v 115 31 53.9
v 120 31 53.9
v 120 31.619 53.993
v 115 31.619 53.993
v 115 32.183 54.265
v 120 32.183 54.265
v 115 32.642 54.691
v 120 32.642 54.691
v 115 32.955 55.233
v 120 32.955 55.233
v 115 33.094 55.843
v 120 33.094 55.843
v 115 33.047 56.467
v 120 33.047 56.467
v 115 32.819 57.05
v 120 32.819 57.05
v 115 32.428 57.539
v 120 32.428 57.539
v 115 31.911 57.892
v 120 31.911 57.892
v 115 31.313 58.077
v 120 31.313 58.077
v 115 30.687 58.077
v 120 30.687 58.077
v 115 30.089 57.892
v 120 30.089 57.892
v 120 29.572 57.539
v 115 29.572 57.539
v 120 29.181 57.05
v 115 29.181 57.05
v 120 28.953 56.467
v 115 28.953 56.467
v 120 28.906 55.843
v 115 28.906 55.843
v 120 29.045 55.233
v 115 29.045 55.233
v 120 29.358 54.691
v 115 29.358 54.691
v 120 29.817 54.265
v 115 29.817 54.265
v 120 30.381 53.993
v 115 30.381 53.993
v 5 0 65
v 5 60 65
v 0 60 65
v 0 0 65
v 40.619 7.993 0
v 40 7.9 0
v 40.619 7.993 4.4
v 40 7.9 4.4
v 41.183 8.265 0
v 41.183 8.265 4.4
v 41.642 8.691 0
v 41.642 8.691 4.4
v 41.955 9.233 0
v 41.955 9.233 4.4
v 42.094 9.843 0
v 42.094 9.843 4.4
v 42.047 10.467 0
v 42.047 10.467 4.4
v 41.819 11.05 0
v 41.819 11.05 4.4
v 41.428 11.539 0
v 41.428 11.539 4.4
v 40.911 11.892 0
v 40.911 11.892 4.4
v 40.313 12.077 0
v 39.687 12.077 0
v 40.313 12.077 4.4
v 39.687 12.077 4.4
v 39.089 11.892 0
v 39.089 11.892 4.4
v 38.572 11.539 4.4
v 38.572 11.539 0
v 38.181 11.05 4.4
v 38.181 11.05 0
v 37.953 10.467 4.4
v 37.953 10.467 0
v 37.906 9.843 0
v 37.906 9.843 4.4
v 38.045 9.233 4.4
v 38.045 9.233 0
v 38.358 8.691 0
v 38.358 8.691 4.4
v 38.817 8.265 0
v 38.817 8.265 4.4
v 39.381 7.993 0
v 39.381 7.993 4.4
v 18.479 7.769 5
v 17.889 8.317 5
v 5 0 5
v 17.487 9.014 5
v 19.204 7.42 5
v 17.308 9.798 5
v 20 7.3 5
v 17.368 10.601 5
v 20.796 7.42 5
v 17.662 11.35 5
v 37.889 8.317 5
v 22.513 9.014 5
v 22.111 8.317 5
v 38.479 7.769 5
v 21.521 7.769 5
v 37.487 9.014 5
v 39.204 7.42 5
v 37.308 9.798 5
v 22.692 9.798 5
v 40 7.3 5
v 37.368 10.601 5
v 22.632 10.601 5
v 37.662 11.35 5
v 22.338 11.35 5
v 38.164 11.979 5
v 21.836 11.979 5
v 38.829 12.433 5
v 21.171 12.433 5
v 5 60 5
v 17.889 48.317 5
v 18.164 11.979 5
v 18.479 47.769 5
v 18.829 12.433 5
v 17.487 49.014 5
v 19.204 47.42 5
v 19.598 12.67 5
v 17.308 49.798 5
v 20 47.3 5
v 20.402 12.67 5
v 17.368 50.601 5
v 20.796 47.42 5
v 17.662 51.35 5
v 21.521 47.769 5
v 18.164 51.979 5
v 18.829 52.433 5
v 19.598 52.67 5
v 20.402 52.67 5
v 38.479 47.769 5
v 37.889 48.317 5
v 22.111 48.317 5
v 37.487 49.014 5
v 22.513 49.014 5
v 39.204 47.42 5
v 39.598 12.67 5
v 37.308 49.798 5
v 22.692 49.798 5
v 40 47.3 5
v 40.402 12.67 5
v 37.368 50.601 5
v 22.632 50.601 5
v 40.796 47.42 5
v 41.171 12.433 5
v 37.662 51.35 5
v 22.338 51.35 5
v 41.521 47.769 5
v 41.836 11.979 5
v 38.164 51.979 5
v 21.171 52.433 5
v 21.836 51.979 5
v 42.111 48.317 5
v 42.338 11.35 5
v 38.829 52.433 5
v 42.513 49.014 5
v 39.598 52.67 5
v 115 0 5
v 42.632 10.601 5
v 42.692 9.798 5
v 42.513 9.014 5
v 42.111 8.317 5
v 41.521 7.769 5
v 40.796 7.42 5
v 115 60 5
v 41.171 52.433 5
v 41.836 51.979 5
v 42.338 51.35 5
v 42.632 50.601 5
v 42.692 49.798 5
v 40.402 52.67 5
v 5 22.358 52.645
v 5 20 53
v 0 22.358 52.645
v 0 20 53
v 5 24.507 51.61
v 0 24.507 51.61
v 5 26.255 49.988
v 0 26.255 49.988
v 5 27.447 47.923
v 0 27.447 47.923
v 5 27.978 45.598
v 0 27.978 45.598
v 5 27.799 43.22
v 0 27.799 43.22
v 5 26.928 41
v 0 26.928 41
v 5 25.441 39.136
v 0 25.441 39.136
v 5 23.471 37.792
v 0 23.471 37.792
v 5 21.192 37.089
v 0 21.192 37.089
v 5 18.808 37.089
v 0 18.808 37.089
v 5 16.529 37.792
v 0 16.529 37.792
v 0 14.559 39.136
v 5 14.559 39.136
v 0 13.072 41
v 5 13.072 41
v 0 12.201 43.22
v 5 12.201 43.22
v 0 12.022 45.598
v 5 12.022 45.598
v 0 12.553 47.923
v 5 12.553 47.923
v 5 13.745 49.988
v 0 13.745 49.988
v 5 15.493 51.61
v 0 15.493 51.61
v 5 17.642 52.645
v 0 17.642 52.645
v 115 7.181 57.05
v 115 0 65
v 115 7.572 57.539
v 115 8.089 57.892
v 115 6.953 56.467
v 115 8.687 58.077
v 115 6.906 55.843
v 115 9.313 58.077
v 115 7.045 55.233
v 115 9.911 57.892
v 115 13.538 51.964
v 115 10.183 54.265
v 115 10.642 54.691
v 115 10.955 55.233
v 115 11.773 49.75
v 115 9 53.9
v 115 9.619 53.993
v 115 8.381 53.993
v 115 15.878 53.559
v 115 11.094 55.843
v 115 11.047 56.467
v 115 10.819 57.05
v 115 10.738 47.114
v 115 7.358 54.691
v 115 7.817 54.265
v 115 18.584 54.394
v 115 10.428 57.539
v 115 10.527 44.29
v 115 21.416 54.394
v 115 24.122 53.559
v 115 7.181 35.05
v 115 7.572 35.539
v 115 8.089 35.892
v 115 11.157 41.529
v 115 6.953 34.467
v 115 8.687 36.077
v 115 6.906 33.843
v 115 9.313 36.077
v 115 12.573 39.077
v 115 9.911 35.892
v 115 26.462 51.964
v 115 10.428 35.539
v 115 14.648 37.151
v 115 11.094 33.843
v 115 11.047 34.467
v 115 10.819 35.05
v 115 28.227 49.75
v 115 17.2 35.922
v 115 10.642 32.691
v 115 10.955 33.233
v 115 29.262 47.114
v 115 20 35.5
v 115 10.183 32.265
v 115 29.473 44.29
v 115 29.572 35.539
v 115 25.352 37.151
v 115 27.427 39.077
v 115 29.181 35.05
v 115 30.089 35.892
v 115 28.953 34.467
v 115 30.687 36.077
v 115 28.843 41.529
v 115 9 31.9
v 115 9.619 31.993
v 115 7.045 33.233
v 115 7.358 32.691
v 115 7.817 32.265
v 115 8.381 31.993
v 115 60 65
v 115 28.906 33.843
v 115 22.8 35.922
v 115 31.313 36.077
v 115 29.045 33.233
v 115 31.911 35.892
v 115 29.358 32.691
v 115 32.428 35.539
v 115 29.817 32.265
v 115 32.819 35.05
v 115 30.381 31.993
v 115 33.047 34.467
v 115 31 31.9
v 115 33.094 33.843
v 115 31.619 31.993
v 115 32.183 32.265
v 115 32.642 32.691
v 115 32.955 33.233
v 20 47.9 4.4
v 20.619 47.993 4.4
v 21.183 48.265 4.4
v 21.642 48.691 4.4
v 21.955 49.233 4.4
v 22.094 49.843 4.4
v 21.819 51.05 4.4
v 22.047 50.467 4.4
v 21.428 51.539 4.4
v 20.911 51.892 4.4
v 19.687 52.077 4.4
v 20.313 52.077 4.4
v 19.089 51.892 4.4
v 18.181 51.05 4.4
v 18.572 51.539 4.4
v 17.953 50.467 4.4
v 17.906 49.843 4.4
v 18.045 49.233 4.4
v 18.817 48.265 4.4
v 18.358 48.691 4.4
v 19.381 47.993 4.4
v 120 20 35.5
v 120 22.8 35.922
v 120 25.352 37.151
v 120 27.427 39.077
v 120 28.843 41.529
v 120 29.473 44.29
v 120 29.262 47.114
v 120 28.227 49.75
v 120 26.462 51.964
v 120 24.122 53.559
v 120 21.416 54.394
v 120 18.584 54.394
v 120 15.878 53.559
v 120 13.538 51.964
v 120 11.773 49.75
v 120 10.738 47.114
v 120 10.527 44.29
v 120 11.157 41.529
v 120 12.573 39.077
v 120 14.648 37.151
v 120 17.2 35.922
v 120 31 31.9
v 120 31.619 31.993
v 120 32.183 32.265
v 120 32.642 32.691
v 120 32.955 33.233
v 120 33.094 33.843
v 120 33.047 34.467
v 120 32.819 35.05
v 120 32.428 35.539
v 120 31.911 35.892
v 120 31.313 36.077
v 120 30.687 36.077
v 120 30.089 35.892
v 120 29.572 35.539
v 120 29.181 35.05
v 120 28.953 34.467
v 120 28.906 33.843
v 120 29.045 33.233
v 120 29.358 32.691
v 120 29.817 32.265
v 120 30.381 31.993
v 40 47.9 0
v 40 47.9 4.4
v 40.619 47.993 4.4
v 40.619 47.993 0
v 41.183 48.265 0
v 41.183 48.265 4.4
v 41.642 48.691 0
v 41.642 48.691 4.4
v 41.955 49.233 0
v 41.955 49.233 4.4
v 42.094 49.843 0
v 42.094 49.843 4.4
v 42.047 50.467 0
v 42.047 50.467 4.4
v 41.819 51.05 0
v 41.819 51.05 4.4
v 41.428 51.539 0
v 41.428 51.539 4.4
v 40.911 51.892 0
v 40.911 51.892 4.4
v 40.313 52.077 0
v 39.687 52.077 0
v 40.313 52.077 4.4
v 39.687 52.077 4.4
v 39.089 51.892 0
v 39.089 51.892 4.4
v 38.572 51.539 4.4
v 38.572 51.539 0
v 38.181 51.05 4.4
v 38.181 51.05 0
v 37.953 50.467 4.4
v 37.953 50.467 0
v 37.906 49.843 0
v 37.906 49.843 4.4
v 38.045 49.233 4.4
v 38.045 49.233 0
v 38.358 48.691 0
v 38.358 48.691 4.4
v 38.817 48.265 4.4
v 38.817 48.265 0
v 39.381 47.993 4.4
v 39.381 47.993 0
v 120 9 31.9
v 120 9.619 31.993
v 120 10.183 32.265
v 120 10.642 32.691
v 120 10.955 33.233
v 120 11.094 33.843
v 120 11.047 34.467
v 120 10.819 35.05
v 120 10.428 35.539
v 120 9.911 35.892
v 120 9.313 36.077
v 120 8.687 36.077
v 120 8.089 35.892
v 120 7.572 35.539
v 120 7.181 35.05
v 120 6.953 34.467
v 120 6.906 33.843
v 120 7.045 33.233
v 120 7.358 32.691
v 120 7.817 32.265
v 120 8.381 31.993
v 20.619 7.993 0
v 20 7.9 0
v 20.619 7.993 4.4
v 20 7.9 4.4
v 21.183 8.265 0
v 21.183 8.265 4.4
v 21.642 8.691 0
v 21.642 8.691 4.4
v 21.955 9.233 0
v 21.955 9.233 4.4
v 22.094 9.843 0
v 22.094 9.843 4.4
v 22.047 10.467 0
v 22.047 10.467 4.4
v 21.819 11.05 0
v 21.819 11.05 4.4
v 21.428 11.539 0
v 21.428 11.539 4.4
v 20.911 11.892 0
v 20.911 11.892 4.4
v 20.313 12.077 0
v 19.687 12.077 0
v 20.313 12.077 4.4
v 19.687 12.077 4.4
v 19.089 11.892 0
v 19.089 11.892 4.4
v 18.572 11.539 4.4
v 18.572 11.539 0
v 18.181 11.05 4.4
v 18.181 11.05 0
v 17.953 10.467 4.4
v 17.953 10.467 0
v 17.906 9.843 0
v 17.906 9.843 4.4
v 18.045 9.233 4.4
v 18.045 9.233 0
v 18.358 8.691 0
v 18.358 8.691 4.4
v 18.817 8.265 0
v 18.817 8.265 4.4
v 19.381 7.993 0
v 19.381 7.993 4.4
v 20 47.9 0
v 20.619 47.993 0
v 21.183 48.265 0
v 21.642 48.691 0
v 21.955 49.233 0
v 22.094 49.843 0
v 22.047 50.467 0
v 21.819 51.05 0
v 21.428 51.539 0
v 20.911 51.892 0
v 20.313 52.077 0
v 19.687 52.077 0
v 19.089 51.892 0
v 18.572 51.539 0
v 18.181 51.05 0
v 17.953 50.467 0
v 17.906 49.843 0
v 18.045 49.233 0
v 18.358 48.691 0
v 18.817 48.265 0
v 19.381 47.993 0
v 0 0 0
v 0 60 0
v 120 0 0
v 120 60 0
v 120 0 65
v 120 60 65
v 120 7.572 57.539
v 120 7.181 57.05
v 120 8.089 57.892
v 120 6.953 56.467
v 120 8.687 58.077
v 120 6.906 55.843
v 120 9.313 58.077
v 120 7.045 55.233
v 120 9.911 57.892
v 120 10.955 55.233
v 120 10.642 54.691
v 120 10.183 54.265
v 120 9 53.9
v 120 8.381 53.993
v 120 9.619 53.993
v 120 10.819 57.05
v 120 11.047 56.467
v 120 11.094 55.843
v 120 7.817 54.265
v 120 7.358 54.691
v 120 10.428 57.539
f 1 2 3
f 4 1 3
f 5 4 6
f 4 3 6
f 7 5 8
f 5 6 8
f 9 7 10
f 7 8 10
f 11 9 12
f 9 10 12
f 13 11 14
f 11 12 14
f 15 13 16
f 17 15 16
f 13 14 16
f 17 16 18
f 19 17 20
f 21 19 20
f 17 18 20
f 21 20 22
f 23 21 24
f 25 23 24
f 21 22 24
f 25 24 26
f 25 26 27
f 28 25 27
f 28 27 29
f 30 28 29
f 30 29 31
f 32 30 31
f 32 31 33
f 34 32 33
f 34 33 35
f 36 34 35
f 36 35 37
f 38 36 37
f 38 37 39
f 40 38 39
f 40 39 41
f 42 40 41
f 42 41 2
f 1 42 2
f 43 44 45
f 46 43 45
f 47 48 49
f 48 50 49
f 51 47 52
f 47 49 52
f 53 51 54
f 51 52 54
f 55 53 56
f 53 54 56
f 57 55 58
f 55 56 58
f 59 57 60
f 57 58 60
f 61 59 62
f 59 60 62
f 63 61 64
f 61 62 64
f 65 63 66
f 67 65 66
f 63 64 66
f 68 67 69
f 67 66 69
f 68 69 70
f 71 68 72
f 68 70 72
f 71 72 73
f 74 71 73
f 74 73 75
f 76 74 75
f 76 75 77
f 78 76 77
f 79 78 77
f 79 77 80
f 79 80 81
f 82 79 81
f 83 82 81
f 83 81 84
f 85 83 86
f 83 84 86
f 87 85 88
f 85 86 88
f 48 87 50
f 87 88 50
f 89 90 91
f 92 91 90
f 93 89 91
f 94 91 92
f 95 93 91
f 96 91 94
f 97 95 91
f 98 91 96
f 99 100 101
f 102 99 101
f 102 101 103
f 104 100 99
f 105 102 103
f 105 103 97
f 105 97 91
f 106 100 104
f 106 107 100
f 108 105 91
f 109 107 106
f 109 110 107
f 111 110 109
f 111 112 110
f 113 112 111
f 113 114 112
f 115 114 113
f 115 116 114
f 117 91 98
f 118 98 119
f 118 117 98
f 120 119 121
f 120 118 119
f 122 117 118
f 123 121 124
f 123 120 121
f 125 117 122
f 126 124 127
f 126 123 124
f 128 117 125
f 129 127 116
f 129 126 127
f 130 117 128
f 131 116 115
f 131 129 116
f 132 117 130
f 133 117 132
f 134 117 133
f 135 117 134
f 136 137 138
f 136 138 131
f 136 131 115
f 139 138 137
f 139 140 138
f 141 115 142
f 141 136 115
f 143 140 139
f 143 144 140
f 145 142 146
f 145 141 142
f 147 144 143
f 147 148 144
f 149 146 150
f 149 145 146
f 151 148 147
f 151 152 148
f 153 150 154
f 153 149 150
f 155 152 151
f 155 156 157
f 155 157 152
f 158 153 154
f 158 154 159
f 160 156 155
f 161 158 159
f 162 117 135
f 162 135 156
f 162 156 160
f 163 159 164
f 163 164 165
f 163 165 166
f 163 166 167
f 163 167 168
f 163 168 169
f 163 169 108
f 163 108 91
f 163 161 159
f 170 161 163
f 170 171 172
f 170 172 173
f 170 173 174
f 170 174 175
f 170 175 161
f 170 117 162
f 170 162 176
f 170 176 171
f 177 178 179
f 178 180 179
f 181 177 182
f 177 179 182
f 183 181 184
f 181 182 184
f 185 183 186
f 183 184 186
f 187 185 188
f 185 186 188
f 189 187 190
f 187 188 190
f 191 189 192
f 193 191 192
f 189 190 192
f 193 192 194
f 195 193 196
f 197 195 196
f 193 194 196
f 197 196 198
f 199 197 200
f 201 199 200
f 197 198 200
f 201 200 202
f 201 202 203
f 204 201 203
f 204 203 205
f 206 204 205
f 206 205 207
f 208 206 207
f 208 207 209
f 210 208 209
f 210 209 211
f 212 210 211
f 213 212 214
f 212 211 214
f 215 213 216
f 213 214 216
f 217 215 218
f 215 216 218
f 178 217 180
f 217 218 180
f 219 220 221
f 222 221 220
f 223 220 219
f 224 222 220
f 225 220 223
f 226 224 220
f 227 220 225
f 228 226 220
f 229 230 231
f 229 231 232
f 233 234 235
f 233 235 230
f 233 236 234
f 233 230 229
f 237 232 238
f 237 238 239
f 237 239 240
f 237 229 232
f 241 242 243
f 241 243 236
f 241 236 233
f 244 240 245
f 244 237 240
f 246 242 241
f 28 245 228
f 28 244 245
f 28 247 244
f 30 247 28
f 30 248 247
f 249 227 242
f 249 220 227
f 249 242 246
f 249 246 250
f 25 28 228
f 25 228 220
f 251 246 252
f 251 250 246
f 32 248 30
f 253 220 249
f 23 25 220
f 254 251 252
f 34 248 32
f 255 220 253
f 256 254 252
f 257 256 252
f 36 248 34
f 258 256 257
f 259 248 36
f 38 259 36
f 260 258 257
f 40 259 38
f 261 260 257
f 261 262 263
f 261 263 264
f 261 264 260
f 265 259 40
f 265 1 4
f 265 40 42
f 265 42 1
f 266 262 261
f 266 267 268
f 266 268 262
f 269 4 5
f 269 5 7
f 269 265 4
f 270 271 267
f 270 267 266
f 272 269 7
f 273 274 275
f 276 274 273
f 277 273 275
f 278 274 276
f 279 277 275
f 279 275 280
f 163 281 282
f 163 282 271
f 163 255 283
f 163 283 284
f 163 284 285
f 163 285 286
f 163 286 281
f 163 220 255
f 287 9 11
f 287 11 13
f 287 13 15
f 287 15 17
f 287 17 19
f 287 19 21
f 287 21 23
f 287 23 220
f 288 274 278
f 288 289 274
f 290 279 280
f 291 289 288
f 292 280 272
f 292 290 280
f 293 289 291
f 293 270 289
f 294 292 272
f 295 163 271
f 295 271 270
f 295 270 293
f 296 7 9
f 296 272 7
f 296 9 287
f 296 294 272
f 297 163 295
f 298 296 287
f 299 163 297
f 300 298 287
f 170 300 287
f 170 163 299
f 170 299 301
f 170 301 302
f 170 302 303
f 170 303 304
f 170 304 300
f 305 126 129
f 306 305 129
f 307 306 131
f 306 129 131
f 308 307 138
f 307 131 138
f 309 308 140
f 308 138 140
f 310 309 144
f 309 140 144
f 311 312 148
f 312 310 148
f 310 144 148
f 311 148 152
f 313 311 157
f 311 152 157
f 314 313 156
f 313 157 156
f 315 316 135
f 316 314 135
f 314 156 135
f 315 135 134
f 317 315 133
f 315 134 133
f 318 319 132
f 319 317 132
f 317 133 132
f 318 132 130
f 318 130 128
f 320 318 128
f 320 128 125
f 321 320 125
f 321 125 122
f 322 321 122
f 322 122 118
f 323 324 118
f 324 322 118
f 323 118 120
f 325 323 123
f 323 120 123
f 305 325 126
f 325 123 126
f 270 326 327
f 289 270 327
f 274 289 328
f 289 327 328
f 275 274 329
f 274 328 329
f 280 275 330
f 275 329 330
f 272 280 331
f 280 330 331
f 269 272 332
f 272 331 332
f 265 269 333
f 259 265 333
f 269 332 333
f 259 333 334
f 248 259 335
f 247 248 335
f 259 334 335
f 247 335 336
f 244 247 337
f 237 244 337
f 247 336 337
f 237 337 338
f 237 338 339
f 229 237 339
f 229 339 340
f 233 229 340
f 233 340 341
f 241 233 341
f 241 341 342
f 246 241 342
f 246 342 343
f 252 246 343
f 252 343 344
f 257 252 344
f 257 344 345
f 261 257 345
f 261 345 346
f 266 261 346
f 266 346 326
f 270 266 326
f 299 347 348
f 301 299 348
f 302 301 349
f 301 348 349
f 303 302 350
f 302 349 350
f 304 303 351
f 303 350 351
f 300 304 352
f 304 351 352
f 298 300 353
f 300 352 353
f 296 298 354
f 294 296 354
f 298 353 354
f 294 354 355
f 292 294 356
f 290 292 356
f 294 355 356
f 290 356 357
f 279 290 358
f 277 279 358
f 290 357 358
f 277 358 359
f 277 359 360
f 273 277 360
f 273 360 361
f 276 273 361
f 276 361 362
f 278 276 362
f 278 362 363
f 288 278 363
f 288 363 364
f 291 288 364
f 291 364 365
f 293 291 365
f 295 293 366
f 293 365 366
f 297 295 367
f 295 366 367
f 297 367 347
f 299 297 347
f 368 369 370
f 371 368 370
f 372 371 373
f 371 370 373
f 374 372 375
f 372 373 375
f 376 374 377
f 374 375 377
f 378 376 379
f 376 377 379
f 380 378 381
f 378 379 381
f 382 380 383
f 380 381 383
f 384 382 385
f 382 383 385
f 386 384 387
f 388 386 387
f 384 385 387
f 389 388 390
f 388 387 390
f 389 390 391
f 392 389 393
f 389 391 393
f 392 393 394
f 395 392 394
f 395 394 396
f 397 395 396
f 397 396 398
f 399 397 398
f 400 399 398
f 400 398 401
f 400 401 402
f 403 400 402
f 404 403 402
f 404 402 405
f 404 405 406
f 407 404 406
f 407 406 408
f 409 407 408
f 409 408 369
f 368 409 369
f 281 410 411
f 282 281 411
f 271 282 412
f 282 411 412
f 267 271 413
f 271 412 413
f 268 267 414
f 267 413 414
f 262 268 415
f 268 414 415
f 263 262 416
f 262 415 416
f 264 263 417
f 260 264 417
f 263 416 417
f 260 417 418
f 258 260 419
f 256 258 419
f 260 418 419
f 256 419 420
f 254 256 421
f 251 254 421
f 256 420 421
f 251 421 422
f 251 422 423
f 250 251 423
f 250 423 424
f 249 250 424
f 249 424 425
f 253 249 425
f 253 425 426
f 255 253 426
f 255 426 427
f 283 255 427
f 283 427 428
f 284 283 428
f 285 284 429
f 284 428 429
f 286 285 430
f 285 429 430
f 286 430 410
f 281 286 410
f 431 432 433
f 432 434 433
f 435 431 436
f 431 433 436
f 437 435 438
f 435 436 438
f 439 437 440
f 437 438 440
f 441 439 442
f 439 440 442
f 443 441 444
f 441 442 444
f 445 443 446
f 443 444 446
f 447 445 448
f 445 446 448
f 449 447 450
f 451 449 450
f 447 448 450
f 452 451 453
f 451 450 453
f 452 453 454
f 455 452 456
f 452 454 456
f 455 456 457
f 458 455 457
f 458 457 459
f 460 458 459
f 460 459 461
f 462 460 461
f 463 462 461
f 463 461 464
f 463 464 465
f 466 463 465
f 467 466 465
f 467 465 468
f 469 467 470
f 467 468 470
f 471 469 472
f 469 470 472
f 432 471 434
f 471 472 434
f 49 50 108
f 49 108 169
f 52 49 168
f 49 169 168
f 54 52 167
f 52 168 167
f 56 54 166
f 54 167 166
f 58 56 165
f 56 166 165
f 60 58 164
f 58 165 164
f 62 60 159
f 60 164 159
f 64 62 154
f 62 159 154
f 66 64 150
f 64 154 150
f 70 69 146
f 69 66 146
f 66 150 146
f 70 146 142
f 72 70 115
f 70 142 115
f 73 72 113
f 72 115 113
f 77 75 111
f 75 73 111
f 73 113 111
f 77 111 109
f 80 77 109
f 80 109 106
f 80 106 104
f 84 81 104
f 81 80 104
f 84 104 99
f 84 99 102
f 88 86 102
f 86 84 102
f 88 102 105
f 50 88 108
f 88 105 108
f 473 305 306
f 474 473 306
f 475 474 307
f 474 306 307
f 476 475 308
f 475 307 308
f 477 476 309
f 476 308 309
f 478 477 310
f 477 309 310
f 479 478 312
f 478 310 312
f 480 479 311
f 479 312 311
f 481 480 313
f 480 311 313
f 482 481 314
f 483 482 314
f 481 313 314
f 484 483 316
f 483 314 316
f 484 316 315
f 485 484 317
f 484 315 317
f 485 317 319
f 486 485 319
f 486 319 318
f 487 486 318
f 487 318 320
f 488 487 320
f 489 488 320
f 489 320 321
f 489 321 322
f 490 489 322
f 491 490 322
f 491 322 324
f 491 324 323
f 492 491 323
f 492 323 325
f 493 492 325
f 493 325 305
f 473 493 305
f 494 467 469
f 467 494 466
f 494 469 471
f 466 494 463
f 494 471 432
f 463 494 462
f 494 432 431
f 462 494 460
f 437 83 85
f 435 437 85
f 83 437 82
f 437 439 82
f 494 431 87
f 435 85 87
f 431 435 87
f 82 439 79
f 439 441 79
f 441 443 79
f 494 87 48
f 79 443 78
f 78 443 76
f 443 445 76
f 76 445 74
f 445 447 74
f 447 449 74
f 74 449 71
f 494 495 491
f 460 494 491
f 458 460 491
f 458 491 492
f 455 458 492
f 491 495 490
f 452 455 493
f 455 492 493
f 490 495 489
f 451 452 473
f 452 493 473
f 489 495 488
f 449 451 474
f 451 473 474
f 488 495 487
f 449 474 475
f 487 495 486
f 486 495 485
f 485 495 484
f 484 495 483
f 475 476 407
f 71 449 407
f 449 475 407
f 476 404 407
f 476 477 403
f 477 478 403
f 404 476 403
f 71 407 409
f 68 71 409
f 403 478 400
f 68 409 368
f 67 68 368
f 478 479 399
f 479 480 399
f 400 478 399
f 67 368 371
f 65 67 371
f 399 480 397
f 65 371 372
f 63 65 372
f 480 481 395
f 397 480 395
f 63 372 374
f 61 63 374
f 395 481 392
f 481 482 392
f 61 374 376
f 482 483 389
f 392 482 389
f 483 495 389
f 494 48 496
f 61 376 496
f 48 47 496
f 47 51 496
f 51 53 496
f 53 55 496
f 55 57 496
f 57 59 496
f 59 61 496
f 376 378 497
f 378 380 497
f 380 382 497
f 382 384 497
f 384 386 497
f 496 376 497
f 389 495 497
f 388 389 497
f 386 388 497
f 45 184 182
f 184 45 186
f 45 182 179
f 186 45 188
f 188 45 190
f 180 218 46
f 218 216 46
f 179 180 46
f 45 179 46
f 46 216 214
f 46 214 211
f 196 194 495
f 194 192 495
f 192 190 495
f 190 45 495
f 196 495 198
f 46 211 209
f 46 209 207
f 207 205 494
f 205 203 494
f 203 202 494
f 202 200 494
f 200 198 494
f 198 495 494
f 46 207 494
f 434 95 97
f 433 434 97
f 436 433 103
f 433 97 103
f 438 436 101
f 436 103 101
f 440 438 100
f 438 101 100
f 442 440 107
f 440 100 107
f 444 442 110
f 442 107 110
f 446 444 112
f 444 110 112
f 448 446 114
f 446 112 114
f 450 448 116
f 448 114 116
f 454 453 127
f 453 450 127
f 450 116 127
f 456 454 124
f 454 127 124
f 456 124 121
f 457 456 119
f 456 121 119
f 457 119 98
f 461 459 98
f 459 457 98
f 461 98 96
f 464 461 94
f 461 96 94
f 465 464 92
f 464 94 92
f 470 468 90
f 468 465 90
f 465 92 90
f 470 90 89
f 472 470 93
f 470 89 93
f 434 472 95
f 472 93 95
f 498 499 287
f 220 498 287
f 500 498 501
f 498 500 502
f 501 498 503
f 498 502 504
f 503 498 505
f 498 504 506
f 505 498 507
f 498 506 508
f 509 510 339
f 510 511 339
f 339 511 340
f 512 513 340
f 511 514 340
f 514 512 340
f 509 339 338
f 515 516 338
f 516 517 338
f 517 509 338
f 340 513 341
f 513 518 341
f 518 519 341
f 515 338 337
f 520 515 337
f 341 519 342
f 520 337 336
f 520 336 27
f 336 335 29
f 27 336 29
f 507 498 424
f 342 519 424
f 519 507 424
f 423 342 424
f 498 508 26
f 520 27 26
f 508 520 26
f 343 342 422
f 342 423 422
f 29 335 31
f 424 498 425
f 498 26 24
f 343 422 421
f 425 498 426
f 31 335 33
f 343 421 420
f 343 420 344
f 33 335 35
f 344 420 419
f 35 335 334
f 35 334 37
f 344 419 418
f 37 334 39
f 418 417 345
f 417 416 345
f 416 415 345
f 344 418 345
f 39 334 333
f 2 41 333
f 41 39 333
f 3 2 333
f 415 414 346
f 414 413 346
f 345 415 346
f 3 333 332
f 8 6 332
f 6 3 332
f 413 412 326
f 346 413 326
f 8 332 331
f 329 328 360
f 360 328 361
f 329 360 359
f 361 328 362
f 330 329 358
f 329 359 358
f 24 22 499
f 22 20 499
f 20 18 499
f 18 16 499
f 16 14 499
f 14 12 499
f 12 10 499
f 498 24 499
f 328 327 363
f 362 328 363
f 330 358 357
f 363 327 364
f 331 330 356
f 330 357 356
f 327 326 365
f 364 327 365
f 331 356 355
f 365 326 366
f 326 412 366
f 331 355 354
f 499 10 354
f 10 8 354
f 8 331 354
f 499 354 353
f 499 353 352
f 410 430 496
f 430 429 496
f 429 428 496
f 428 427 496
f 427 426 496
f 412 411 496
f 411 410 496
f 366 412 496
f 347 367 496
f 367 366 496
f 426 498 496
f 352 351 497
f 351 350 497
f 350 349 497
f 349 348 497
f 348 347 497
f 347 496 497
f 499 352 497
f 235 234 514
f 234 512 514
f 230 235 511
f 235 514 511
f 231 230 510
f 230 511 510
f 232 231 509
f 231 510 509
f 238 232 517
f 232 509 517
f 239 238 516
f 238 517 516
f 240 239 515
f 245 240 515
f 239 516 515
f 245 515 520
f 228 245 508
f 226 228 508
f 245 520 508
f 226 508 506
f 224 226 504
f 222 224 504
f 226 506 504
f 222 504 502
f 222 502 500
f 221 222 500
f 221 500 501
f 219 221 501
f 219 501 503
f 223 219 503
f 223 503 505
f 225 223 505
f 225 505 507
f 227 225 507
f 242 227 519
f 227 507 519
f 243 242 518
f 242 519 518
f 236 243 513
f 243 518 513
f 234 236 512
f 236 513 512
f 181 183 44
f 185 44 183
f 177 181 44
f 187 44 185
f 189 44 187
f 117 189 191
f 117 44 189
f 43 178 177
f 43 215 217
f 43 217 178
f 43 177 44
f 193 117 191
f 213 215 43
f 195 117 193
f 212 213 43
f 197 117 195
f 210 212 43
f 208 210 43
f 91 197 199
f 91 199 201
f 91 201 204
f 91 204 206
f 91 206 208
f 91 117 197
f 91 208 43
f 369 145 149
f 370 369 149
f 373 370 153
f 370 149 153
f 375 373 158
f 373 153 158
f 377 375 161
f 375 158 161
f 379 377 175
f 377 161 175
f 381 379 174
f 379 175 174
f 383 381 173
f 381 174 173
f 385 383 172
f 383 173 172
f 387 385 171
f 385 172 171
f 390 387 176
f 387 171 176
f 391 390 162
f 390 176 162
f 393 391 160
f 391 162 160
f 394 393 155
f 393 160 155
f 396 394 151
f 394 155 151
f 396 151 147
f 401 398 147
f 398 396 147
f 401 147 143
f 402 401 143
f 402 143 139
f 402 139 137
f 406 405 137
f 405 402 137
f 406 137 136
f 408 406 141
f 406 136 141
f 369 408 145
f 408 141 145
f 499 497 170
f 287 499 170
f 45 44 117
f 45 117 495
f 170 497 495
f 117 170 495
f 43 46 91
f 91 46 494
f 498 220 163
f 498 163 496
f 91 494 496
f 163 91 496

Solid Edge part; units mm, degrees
sketch "Sketch1" plane through (0, 0, 0) normal (0, 0, 1) x (1, 0, 0)
  line L0 (120, 60) -> (0, 60)
  line L1 (0, 60) -> (0, 0)
  line L2 (0, 0) -> (120, 0)
  line L3 (120, 0) -> (120, 60)
extrude "Protrusion1" add sketch "Sketch1" along normal blind 5
sketch "Sketch2" plane through (60, 20, 5) normal (0, 0, 1) x (1, 0, 0)
  line L0 (55, -20) -> (55, 40)
  line L1 (55, 40) -> (60, 40)
  line L2 (60, 40) -> (60, -20)
  line L3 (60, -20) -> (55, -20)
  line L4 (-55, 40) -> (-55, -20)
  line L5 (-55, -20) -> (-60, -20)
  line L6 (-60, -20) -> (-60, 40)
  line L7 (-60, 40) -> (-55, 40)
  dimension "D1" = 5
extrude "Extrusionsausprägung_2" add sketch "Sketch2" along normal blind 60
hole "Bohrung_1" at (120, 20, 45) direction (-1, 0, 0) diameter 19 end up to next
hole "Hole_2" at (20, 10, 5) direction (0, 0, -1) diameter 4.2 end up to next start chamfer 0.6 start chamfer angle 45
hole "Hole1" at (20, 50, 5) direction (0, 0, -1) diameter 4.2 end up to next start chamfer 0.6 start chamfer angle 45
hole "Hole2" at (40, 50, 5) direction (0, 0, -1) diameter 4.2 end up to next start chamfer 0.6 start chamfer angle 45
hole "Hole3" at (40, 10, 5) direction (0, 0, -1) diameter 4.2 end up to next start chamfer 0.6 start chamfer angle 45
hole "Hole4" at (120, 9, 56) direction (-1, 0, 0) diameter 4.2 end up to next
hole "Hole5" at (120, 9, 34) direction (-1, 0, 0) diameter 4.2 end up to next
hole "Hole6" at (120, 31, 34) direction (-1, 0, 0) diameter 4.2 end up to next
hole "Hole7" at (120, 31, 56) direction (-1, 0, 0) diameter 4.2 end up to next
hole "Hole_10" at (0, 20, 45) direction (1, 0, 0) diameter 16 end up to next
